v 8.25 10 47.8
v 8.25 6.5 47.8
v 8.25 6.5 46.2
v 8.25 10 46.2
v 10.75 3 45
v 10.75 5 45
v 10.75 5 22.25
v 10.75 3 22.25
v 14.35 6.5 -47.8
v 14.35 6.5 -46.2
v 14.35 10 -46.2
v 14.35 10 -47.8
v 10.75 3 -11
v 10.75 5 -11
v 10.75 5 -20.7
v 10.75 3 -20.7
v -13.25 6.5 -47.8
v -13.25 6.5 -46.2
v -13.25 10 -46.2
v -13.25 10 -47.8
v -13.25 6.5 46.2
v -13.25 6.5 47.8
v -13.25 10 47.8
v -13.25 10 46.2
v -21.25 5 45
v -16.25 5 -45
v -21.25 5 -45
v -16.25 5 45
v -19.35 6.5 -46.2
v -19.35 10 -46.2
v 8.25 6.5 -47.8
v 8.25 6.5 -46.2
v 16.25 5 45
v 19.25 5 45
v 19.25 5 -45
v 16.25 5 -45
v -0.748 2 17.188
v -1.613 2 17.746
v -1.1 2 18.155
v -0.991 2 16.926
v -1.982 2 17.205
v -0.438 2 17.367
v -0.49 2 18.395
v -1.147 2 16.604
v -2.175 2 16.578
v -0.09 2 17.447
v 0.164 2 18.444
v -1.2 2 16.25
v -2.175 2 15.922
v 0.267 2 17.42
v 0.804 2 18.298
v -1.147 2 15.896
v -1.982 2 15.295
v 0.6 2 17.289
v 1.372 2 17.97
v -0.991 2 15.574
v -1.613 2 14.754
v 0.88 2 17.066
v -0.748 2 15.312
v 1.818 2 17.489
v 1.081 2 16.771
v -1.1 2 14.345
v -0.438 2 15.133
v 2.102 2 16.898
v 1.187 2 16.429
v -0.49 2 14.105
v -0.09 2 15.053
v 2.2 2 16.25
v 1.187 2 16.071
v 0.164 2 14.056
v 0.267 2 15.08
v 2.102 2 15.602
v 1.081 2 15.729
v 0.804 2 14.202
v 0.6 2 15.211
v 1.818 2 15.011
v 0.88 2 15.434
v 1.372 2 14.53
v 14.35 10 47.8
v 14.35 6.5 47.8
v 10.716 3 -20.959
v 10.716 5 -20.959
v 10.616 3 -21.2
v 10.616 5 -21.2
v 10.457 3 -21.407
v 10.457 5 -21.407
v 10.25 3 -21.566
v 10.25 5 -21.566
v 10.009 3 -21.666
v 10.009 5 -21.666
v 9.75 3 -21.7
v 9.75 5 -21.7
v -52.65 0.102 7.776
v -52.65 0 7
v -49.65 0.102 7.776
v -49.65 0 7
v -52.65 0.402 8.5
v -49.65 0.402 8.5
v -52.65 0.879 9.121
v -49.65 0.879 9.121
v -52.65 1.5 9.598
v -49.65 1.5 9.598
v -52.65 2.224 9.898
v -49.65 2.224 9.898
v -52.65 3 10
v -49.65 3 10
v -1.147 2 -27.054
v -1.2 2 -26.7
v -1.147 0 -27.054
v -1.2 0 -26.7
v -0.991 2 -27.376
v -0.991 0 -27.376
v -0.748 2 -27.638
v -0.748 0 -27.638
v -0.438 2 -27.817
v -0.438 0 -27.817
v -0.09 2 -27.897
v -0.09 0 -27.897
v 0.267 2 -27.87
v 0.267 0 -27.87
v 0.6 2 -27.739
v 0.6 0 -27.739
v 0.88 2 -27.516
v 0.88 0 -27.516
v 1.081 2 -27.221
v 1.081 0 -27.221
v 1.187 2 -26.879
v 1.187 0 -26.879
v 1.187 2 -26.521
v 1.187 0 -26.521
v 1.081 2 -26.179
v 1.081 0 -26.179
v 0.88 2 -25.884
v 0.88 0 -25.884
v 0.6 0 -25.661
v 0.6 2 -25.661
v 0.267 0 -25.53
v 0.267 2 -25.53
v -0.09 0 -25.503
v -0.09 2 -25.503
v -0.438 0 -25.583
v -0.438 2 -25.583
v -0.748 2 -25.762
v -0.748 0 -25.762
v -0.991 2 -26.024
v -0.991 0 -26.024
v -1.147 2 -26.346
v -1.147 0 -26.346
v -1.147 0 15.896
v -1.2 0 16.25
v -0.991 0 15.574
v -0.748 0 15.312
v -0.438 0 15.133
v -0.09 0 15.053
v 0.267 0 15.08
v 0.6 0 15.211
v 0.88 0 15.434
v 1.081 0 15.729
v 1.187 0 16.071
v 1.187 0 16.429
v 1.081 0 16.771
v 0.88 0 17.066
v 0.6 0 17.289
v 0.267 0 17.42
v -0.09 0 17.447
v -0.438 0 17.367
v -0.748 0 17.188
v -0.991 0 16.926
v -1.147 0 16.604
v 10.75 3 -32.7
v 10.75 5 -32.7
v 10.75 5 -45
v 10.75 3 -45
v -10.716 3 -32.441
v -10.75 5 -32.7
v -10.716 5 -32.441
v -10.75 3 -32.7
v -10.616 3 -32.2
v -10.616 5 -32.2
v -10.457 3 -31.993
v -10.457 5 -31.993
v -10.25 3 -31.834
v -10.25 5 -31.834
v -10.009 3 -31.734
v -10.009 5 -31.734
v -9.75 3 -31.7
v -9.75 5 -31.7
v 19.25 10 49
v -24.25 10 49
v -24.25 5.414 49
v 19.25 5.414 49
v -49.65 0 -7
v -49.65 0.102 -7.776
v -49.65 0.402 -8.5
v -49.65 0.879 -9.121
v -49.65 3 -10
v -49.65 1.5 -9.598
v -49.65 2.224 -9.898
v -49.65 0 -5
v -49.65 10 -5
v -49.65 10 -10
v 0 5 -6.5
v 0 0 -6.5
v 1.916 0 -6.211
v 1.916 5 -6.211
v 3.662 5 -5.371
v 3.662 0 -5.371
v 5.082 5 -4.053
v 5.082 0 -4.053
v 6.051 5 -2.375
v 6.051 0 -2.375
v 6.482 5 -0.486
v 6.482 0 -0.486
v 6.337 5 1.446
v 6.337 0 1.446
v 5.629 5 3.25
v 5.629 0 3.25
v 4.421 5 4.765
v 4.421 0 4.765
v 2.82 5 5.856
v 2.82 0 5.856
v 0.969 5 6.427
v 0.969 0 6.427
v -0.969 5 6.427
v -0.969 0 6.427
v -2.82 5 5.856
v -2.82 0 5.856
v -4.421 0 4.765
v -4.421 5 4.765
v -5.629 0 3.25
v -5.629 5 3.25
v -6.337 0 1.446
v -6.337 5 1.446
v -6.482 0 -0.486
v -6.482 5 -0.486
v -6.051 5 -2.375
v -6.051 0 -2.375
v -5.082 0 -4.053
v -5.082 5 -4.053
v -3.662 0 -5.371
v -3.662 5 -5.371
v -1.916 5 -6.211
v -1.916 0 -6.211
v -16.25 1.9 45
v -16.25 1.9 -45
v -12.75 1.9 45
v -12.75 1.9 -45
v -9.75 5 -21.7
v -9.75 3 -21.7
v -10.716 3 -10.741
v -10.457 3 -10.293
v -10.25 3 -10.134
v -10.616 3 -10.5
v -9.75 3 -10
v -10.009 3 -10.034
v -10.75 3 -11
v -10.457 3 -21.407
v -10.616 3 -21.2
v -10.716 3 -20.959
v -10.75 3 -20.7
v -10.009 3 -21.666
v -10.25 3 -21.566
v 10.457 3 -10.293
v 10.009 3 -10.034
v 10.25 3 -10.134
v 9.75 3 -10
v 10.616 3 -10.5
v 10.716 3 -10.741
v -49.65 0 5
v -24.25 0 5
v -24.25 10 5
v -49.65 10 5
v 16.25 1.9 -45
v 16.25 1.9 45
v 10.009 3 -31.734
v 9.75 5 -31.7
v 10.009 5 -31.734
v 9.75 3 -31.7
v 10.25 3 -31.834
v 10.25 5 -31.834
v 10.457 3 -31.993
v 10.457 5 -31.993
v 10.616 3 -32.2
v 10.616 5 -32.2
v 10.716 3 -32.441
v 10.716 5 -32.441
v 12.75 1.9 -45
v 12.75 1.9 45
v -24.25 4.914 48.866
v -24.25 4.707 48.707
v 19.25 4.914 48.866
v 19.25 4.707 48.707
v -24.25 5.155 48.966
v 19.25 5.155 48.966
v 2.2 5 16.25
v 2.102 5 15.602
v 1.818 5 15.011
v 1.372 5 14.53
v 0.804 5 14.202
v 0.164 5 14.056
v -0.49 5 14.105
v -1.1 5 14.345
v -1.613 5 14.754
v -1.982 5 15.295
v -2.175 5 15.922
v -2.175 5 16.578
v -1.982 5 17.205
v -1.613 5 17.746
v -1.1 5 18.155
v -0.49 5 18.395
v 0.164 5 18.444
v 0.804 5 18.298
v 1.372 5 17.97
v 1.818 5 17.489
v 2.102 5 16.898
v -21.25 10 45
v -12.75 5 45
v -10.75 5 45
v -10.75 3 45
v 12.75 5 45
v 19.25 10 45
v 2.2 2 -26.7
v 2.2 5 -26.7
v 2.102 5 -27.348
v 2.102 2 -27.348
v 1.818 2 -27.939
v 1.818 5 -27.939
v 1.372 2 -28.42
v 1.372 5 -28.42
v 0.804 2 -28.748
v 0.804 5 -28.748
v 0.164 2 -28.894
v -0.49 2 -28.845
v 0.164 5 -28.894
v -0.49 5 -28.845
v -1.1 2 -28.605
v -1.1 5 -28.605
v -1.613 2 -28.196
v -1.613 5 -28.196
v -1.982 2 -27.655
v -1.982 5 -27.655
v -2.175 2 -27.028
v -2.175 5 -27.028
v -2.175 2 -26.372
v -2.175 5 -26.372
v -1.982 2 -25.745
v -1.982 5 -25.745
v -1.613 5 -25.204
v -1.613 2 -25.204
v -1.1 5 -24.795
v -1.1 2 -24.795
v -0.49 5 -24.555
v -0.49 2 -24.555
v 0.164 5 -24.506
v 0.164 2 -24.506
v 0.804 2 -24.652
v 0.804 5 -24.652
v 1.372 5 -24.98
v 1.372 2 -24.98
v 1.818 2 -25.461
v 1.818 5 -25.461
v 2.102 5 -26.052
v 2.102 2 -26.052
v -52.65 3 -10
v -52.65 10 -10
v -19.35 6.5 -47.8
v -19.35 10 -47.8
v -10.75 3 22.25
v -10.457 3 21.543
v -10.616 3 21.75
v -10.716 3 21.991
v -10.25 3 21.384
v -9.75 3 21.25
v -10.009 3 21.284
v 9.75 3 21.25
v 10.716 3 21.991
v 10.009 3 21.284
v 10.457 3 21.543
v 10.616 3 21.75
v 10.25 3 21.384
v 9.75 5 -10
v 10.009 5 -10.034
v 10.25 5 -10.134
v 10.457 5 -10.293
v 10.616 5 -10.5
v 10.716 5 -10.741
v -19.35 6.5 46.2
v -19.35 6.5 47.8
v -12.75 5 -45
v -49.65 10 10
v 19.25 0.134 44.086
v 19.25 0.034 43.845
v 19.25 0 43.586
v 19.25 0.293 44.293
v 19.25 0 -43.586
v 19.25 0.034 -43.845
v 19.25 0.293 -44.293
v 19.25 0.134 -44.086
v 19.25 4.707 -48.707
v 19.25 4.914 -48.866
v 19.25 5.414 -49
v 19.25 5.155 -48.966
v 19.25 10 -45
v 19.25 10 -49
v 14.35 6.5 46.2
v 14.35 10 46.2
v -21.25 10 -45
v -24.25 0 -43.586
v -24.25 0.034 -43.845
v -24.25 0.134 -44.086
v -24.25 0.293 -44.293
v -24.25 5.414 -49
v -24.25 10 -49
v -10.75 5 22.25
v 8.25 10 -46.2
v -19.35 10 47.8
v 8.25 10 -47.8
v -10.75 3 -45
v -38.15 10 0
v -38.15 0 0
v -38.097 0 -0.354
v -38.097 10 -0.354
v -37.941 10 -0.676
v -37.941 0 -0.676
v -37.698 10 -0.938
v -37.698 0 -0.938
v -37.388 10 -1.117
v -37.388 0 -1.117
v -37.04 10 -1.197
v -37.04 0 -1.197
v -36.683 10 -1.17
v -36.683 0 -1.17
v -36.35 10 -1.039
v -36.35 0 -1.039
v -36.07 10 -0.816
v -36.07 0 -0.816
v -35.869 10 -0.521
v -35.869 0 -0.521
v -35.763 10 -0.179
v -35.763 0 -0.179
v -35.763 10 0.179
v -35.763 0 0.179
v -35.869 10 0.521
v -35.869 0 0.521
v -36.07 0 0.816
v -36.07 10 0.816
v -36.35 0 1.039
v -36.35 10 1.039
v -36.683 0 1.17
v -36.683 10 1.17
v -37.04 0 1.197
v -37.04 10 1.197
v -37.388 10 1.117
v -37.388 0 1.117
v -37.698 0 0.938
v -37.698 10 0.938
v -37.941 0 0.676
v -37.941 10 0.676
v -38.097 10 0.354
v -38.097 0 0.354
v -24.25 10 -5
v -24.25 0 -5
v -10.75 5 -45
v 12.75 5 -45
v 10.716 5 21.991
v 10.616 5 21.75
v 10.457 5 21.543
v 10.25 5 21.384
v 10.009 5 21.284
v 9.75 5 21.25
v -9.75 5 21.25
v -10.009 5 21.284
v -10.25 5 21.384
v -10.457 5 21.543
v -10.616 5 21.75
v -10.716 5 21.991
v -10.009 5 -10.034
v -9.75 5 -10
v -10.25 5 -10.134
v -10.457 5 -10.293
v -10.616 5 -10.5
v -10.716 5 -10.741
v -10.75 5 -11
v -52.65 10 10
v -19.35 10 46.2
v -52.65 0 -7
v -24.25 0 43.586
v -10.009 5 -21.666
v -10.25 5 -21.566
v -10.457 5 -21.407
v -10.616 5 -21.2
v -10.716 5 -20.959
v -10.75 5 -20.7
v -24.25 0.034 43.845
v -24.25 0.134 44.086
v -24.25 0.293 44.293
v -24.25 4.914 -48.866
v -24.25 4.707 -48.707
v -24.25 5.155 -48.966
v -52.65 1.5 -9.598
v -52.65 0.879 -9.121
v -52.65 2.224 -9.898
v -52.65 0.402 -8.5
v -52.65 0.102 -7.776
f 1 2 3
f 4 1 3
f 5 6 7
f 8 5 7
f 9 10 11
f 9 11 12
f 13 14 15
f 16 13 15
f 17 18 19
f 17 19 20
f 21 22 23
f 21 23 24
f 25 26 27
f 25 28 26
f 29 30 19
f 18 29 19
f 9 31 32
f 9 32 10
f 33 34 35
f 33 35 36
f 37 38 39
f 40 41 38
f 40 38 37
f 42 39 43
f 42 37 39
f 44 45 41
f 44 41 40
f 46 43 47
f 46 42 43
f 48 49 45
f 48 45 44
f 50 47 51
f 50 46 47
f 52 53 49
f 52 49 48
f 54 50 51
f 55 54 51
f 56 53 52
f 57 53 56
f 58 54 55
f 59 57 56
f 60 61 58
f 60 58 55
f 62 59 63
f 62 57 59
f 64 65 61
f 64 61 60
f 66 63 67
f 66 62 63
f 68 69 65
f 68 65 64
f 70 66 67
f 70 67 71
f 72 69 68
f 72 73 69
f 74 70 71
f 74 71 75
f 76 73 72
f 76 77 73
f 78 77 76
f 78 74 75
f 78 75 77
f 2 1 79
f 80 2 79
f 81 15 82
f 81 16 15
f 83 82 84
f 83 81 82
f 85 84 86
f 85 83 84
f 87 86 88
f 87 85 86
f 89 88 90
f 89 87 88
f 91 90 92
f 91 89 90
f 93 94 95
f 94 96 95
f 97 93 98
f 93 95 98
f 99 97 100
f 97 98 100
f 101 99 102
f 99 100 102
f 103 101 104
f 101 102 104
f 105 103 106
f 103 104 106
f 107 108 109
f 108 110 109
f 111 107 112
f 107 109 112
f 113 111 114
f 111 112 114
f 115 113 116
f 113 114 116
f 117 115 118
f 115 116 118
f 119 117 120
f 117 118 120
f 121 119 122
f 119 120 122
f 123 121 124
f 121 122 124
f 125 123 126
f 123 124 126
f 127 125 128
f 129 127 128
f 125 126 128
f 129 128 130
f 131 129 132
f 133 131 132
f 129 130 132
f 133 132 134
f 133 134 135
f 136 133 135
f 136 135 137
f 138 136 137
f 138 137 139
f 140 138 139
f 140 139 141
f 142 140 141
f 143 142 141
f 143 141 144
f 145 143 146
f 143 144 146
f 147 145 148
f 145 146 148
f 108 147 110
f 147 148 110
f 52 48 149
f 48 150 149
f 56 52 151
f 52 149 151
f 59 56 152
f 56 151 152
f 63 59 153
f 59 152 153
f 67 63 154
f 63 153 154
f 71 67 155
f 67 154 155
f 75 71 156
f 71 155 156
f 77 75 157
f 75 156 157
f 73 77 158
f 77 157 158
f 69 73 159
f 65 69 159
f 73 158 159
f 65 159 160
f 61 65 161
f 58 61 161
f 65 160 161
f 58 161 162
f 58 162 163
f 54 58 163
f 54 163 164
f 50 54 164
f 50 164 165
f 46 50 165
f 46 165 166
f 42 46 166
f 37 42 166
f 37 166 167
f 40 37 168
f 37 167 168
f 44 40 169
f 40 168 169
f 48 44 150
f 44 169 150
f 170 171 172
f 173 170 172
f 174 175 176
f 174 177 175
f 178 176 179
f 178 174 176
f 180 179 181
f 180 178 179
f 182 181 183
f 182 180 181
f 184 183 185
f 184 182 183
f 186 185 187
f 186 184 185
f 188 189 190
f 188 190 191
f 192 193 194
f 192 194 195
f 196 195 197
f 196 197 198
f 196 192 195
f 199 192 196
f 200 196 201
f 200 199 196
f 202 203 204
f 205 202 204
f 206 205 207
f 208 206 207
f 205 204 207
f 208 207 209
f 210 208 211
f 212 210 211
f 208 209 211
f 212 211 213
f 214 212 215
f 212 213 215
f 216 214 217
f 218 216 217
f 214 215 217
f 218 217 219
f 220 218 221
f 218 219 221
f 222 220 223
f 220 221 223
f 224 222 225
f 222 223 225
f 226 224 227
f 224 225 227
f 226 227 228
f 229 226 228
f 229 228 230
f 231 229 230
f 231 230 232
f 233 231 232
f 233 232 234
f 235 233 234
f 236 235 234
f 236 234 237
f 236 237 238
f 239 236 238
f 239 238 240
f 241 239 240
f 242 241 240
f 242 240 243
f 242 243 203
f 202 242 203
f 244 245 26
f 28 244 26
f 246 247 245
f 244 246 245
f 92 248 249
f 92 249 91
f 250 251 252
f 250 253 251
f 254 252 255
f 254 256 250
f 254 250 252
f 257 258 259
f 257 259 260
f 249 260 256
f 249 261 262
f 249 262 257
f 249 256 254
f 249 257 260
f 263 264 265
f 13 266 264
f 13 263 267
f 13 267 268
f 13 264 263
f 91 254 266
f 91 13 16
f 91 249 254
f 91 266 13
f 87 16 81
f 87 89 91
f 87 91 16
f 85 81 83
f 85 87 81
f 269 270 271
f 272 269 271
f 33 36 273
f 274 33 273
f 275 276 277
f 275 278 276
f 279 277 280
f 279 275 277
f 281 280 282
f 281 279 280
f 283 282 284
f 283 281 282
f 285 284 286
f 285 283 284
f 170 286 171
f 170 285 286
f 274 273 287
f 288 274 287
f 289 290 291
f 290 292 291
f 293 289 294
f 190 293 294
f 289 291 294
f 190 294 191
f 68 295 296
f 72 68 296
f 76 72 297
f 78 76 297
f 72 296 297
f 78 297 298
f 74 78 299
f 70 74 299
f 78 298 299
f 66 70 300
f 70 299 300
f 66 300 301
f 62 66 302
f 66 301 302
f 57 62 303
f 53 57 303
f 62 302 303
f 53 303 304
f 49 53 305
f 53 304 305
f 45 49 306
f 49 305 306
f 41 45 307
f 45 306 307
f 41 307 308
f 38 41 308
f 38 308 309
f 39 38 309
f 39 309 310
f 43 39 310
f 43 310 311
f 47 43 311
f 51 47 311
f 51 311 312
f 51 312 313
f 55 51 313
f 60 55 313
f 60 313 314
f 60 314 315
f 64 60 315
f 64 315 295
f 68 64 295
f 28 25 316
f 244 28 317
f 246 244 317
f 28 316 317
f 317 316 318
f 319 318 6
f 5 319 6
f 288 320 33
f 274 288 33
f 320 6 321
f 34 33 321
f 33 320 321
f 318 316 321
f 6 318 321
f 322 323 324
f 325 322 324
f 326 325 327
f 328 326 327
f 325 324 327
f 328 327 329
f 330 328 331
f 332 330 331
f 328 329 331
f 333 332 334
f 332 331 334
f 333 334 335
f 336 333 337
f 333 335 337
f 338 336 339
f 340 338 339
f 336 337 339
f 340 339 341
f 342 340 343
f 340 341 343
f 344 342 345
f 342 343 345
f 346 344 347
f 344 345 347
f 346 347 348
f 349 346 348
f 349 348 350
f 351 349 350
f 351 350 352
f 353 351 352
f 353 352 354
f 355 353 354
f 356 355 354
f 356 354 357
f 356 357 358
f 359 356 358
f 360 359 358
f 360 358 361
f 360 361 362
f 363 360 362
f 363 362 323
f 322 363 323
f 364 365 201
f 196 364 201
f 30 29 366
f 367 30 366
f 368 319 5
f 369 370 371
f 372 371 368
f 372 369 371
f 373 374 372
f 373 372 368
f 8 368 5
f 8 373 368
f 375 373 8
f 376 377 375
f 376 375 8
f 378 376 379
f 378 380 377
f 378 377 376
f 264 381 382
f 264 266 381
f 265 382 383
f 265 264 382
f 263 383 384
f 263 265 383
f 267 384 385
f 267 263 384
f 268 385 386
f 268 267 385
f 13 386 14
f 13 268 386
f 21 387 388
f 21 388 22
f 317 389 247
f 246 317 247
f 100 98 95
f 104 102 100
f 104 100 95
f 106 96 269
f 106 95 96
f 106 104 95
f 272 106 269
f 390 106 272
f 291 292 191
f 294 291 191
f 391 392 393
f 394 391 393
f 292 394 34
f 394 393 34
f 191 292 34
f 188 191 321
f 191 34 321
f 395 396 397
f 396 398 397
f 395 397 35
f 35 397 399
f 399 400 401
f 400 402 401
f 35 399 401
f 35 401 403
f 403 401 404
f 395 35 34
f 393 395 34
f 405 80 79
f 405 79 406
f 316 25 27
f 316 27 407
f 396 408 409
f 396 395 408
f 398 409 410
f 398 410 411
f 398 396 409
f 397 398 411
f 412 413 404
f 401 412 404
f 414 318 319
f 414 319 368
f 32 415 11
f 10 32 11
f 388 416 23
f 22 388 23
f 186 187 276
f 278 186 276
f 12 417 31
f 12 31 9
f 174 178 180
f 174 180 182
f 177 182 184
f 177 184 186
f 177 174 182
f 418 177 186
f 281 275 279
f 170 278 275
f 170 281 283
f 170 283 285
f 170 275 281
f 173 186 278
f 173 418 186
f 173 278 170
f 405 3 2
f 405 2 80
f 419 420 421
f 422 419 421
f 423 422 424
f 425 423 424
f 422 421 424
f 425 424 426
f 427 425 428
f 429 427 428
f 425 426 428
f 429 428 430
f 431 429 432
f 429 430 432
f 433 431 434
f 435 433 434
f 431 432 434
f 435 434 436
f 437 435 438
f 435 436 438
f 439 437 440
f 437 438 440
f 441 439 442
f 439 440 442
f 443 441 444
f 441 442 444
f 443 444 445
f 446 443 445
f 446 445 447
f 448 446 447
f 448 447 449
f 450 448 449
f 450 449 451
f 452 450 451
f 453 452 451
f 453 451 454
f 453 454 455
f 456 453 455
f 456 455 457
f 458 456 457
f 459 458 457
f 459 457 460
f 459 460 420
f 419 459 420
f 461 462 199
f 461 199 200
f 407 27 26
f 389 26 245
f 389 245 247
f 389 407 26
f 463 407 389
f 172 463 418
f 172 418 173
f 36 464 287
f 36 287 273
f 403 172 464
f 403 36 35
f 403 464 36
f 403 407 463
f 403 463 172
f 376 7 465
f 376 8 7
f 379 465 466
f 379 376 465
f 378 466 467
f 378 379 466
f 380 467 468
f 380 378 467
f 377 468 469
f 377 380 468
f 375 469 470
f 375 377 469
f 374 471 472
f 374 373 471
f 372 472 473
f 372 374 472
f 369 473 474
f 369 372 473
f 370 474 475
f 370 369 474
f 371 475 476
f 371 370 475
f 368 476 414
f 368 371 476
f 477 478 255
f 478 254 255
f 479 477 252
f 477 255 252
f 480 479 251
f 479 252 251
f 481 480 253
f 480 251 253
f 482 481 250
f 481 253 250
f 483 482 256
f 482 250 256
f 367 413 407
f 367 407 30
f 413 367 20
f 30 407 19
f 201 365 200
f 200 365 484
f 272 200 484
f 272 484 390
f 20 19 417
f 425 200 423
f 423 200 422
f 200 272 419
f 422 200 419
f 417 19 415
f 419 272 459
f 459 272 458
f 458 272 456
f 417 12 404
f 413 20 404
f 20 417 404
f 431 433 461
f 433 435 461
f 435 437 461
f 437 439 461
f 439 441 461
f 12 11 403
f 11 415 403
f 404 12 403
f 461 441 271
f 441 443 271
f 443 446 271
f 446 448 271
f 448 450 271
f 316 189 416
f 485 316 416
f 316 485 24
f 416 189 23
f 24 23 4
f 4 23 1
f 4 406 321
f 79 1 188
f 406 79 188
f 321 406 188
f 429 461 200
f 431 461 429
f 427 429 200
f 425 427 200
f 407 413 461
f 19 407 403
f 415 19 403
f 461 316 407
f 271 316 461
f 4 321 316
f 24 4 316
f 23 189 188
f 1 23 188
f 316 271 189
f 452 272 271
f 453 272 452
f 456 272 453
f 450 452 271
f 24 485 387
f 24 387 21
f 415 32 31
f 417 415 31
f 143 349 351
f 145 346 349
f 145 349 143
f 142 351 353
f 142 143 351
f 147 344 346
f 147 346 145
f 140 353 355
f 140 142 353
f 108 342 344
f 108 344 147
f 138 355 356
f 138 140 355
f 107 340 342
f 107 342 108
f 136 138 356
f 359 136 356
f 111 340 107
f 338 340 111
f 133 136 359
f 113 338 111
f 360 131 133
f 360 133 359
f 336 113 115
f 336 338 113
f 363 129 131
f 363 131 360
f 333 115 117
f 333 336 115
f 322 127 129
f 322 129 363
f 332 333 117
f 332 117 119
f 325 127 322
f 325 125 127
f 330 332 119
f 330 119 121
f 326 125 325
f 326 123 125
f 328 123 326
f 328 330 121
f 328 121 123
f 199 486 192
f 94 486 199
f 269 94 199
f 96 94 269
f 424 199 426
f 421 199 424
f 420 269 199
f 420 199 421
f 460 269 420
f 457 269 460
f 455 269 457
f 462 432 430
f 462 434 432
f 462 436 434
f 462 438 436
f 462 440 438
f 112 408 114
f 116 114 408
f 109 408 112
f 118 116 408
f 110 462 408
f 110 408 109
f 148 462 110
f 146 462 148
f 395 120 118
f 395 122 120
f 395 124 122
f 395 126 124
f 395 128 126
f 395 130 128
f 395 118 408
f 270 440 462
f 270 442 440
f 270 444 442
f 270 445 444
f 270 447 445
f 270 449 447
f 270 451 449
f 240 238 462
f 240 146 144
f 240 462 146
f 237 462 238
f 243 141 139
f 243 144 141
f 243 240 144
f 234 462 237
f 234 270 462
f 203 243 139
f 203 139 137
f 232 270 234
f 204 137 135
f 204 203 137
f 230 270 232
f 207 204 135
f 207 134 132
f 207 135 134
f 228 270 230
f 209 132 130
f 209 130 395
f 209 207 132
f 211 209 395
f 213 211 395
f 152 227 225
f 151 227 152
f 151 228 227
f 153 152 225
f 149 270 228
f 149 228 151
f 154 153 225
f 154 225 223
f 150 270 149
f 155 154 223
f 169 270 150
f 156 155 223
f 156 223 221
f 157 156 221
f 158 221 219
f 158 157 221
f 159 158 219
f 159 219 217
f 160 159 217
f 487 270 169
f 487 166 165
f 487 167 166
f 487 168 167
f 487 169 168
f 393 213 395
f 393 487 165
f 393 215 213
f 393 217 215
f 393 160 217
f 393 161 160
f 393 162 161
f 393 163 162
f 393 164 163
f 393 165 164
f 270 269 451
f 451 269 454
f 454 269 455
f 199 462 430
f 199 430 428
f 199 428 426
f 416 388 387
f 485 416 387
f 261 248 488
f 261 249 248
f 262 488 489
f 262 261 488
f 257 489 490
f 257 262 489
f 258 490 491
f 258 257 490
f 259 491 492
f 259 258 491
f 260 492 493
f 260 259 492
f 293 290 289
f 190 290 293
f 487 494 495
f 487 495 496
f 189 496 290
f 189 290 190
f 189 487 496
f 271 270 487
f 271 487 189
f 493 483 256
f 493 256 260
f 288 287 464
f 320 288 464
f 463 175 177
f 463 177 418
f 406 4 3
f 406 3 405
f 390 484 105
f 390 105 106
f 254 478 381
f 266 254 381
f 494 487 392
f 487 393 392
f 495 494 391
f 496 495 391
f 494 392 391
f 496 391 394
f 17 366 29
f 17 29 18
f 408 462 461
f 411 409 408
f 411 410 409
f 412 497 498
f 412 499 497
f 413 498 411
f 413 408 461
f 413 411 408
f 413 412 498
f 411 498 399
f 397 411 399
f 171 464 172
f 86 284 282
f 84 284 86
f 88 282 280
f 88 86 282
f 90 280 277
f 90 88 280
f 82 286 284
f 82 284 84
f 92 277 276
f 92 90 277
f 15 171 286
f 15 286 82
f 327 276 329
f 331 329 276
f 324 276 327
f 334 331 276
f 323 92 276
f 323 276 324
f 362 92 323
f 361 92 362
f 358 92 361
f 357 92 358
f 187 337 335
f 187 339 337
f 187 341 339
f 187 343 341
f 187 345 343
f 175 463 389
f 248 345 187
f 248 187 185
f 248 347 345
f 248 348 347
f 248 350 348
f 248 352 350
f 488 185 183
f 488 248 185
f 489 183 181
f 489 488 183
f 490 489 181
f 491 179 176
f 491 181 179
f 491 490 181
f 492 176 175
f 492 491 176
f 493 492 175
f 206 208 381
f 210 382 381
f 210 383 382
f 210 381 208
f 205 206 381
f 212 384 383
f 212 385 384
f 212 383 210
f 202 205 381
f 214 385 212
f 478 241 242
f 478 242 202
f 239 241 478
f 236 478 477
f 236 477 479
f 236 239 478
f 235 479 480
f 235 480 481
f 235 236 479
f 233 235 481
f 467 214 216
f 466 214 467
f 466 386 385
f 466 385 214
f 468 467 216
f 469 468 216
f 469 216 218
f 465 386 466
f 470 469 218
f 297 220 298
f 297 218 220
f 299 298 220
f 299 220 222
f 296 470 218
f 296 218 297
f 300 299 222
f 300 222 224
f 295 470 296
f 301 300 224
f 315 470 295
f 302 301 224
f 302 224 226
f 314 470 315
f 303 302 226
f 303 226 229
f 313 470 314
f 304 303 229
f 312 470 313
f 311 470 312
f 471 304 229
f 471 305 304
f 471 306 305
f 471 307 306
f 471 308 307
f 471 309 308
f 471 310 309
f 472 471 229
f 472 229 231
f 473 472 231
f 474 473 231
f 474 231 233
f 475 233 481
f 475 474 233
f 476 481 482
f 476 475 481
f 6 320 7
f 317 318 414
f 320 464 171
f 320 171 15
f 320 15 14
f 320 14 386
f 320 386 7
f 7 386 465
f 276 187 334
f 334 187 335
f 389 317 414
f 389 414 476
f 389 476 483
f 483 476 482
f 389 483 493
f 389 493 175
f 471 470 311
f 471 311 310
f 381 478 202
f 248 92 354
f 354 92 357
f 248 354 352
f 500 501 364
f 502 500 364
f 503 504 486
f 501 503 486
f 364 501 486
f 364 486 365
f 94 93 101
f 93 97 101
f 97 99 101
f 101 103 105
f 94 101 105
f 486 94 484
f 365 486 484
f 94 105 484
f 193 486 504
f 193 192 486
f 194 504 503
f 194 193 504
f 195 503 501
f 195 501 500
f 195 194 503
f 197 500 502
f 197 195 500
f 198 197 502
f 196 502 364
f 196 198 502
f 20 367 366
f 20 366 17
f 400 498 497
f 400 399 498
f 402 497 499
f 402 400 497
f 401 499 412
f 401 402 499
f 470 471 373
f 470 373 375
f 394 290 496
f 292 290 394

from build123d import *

# Parameters (mm, degrees)
BOSS_EXTRUDE1_DEPTH            = 45
SKETCH3_R                      = 6.5
CUT_EXTRUDE1_DEPTH             = 50.199212392
SKETCH5_W                      = 5
SKETCH5_H                      = 10
BOSS_EXTRUDE2_DEPTH            = 45
BOSS_EXTRUDE2_DEPTH_BACK       = 45
SKETCH8_W                      = 43.5
SKETCH8_H                      = 10
BOSS_EXTRUDE3_DEPTH            = 3
MOVE_FACE1_BY                  = 1
MOVE_FACE2_BY                  = 1
SKETCH10_W                     = 6.1
SKETCH10_H                     = 1.6
CUT_EXTRUDE2_DEPTH             = 3.5
CBORE_FOR_M2_SHCS1_D           = 2.4
CBORE_FOR_M2_SHCS1_CBORE_D     = 4.4
CBORE_FOR_M2_SHCS1_CBORE_DEPTH = 3
SKETCH12_W                     = 10
SKETCH12_H                     = 10
BOSS_EXTRUDE4_DEPTH            = 25.4
SKETCH13_W                     = 3
SKETCH13_H                     = 10
BOSS_EXTRUDE5_DEPTH            = 10
FILLET1_R                      = 3
CHAMFER1_SIZE                  = 5
FILLET2_R                      = 1
MOVE_FACE3_BY                  = 2
M2_CLEARANCE_HOLE1_D           = 2.4
SKETCH18_W                     = 21.5
SKETCH18_H                     = 23.75
SKETCH18_H_2                   = 11.7
SKETCH18_H_3                   = 13.3
CUT_EXTRUDE4_DEPTH             = 2
FILLET4_R                      = 1


with BuildPart() as part:
    # Sketch2 → Boss-Extrude1 (new, symmetric)
    with BuildSketch(Plane.XY):
        Polygon((-19.25, 0), (19.25, 0), (19.25, 5), (16.25, 5), (16.25, 1.9), (12.75, 1.9), (12.75, 5), (-12.75, 5), (-12.75, 1.9), (-16.25, 1.9), (-16.25, 5), (-19.25, 5), align=None)
    extrude(amount=BOSS_EXTRUDE1_DEPTH, both=True)

    # Sketch3 → Cut-Extrude1 (cut, through all)
    with BuildSketch(Plane.XZ):
        with Locations(Location((0, 0, 0), (0, 0, 270))):
            Circle(SKETCH3_R)
    extrude(amount=-CUT_EXTRUDE1_DEPTH, mode=Mode.SUBTRACT)

    # Sketch5 → Boss-Extrude2 (add, two sides)
    with BuildSketch(Plane.XY) as boss_extrude2_sk:
        with Locations((-21.75, 5)):
            Rectangle(SKETCH5_W, SKETCH5_H)
    extrude(amount=BOSS_EXTRUDE2_DEPTH)
    extrude(boss_extrude2_sk.sketch, amount=-BOSS_EXTRUDE2_DEPTH_BACK)

    # Sketch8 → Boss-Extrude3 (add)
    with BuildSketch(Plane.XY.offset(45)):
        with Locations((-2.5, 5)):
            Rectangle(SKETCH8_W, SKETCH8_H)
    boss_extrude3 = extrude(amount=BOSS_EXTRUDE3_DEPTH)

    # Mirror1: Boss-Extrude3 across plane
    add(boss_extrude3.mirror(Plane.XY))

    # Move Face1: a face moved outward by 1.0
    extrude(part.faces().sort_by_distance((-2.5, 5, -48))[0], amount=MOVE_FACE1_BY, dir=(0, 0, -1))

    # Move Face2: a face moved outward by 1.0
    extrude(part.faces().sort_by_distance((-2.5, 5, 48))[0], amount=MOVE_FACE2_BY, dir=(0, 0, 1))

    # Sketch10 → Cut-Extrude2 (cut)
    with BuildSketch(Plane(origin=(0, 10, 0), x_dir=(1, 0, 0), z_dir=(0, 1, 0))):
        with Locations((-16.3, 47)):
            Rectangle(SKETCH10_W, SKETCH10_H)
        with Locations((11.3, 47)):
            Rectangle(SKETCH10_W, SKETCH10_H)
        with Locations((-16.3, -47)):
            Rectangle(SKETCH10_W, SKETCH10_H)
        with Locations((11.3, -47)):
            Rectangle(SKETCH10_W, SKETCH10_H)
    extrude(amount=-CUT_EXTRUDE2_DEPTH, mode=Mode.SUBTRACT)

    # CBORE for M2 SHCS1 (through all)
    with Locations(Plane(origin=(0, 5, 0), x_dir=(1, 0, 0), z_dir=(0, 1, 0))):
        with Locations((0, 26.7), (0, -16.25)):
            CounterBoreHole(CBORE_FOR_M2_SHCS1_D / 2, CBORE_FOR_M2_SHCS1_CBORE_D / 2, CBORE_FOR_M2_SHCS1_CBORE_DEPTH)

    # Sketch12 → Boss-Extrude4 (add)
    with BuildSketch(Plane.ZY.offset(24.25)):
        with Locations((0, 5)):
            Rectangle(SKETCH12_W, SKETCH12_H)
    extrude(amount=BOSS_EXTRUDE4_DEPTH)

    # Sketch13 → Boss-Extrude5 (add, symmetric)
    with BuildSketch(Plane.XY):
        with Locations((-51.15, 5)):
            Rectangle(SKETCH13_W, SKETCH13_H)
    extrude(amount=BOSS_EXTRUDE5_DEPTH, both=True)

    # Fillet1
    fillet1_edges = [part.edges().sort_by_distance(p)[0] for p in [
        (-51.15, 0, -10),
        (-51.15, 0, 10),
    ]]
    fillet(fillet1_edges, radius=FILLET1_R)

    # Chamfer1
    chamfer1_edges = [part.edges().sort_by_distance(p)[0] for p in [
        (-2.5, 0, 49),
        (-2.5, 0, -49),
    ]]
    chamfer(chamfer1_edges, length=CHAMFER1_SIZE)

    # Fillet2
    fillet2_edges = [part.edges().sort_by_distance(p)[0] for p in [
        (-2.5, 0, 44),
        (-2.5, 0, -44),
        (-2.5, 5, -49),
        (-2.5, 5, 49),
    ]]
    fillet(fillet2_edges, radius=FILLET2_R)

    # Move Face3: a face moved inward by 2.0
    extrude(part.faces().sort_by_distance((-19.25, 7.5, 0))[0], amount=MOVE_FACE3_BY, dir=(-1, 0, 0), mode=Mode.SUBTRACT)

    # M2 Clearance Hole1 (through all)
    with Locations(Plane(origin=(0, 10, 0), x_dir=(1, 0, 0), z_dir=(0, 1, 0))):
        with Locations((-36.95, 0)):
            Hole(M2_CLEARANCE_HOLE1_D / 2)

    # Sketch18 → Cut-Extrude4 (cut)
    with BuildSketch(Plane(origin=(0, 5, 0), x_dir=(1, 0, 0), z_dir=(0, 1, 0))):
        with Locations((0, -33.125)):
            Rectangle(SKETCH18_W, SKETCH18_H)
        with Locations((0, 15.85)):
            Rectangle(SKETCH18_W, SKETCH18_H_2)
        with Locations((0, 38.35)):
            Rectangle(SKETCH18_W, SKETCH18_H_3)
    extrude(amount=-CUT_EXTRUDE4_DEPTH, mode=Mode.SUBTRACT)

    # Fillet4
    fillet4_edges = [part.edges().sort_by_distance(p)[0] for p in [
        (-10.75, 4, 21.25),
        (10.75, 4, 21.25),
        (-10.75, 4, -10),
        (-10.75, 4, -21.7),
        (10.75, 4, -21.7),
        (10.75, 4, -10),
        (-10.75, 4, -31.7),
        (10.75, 4, -31.7),
    ]]
    fillet(fillet4_edges, radius=FILLET4_R)


solid = part.part
